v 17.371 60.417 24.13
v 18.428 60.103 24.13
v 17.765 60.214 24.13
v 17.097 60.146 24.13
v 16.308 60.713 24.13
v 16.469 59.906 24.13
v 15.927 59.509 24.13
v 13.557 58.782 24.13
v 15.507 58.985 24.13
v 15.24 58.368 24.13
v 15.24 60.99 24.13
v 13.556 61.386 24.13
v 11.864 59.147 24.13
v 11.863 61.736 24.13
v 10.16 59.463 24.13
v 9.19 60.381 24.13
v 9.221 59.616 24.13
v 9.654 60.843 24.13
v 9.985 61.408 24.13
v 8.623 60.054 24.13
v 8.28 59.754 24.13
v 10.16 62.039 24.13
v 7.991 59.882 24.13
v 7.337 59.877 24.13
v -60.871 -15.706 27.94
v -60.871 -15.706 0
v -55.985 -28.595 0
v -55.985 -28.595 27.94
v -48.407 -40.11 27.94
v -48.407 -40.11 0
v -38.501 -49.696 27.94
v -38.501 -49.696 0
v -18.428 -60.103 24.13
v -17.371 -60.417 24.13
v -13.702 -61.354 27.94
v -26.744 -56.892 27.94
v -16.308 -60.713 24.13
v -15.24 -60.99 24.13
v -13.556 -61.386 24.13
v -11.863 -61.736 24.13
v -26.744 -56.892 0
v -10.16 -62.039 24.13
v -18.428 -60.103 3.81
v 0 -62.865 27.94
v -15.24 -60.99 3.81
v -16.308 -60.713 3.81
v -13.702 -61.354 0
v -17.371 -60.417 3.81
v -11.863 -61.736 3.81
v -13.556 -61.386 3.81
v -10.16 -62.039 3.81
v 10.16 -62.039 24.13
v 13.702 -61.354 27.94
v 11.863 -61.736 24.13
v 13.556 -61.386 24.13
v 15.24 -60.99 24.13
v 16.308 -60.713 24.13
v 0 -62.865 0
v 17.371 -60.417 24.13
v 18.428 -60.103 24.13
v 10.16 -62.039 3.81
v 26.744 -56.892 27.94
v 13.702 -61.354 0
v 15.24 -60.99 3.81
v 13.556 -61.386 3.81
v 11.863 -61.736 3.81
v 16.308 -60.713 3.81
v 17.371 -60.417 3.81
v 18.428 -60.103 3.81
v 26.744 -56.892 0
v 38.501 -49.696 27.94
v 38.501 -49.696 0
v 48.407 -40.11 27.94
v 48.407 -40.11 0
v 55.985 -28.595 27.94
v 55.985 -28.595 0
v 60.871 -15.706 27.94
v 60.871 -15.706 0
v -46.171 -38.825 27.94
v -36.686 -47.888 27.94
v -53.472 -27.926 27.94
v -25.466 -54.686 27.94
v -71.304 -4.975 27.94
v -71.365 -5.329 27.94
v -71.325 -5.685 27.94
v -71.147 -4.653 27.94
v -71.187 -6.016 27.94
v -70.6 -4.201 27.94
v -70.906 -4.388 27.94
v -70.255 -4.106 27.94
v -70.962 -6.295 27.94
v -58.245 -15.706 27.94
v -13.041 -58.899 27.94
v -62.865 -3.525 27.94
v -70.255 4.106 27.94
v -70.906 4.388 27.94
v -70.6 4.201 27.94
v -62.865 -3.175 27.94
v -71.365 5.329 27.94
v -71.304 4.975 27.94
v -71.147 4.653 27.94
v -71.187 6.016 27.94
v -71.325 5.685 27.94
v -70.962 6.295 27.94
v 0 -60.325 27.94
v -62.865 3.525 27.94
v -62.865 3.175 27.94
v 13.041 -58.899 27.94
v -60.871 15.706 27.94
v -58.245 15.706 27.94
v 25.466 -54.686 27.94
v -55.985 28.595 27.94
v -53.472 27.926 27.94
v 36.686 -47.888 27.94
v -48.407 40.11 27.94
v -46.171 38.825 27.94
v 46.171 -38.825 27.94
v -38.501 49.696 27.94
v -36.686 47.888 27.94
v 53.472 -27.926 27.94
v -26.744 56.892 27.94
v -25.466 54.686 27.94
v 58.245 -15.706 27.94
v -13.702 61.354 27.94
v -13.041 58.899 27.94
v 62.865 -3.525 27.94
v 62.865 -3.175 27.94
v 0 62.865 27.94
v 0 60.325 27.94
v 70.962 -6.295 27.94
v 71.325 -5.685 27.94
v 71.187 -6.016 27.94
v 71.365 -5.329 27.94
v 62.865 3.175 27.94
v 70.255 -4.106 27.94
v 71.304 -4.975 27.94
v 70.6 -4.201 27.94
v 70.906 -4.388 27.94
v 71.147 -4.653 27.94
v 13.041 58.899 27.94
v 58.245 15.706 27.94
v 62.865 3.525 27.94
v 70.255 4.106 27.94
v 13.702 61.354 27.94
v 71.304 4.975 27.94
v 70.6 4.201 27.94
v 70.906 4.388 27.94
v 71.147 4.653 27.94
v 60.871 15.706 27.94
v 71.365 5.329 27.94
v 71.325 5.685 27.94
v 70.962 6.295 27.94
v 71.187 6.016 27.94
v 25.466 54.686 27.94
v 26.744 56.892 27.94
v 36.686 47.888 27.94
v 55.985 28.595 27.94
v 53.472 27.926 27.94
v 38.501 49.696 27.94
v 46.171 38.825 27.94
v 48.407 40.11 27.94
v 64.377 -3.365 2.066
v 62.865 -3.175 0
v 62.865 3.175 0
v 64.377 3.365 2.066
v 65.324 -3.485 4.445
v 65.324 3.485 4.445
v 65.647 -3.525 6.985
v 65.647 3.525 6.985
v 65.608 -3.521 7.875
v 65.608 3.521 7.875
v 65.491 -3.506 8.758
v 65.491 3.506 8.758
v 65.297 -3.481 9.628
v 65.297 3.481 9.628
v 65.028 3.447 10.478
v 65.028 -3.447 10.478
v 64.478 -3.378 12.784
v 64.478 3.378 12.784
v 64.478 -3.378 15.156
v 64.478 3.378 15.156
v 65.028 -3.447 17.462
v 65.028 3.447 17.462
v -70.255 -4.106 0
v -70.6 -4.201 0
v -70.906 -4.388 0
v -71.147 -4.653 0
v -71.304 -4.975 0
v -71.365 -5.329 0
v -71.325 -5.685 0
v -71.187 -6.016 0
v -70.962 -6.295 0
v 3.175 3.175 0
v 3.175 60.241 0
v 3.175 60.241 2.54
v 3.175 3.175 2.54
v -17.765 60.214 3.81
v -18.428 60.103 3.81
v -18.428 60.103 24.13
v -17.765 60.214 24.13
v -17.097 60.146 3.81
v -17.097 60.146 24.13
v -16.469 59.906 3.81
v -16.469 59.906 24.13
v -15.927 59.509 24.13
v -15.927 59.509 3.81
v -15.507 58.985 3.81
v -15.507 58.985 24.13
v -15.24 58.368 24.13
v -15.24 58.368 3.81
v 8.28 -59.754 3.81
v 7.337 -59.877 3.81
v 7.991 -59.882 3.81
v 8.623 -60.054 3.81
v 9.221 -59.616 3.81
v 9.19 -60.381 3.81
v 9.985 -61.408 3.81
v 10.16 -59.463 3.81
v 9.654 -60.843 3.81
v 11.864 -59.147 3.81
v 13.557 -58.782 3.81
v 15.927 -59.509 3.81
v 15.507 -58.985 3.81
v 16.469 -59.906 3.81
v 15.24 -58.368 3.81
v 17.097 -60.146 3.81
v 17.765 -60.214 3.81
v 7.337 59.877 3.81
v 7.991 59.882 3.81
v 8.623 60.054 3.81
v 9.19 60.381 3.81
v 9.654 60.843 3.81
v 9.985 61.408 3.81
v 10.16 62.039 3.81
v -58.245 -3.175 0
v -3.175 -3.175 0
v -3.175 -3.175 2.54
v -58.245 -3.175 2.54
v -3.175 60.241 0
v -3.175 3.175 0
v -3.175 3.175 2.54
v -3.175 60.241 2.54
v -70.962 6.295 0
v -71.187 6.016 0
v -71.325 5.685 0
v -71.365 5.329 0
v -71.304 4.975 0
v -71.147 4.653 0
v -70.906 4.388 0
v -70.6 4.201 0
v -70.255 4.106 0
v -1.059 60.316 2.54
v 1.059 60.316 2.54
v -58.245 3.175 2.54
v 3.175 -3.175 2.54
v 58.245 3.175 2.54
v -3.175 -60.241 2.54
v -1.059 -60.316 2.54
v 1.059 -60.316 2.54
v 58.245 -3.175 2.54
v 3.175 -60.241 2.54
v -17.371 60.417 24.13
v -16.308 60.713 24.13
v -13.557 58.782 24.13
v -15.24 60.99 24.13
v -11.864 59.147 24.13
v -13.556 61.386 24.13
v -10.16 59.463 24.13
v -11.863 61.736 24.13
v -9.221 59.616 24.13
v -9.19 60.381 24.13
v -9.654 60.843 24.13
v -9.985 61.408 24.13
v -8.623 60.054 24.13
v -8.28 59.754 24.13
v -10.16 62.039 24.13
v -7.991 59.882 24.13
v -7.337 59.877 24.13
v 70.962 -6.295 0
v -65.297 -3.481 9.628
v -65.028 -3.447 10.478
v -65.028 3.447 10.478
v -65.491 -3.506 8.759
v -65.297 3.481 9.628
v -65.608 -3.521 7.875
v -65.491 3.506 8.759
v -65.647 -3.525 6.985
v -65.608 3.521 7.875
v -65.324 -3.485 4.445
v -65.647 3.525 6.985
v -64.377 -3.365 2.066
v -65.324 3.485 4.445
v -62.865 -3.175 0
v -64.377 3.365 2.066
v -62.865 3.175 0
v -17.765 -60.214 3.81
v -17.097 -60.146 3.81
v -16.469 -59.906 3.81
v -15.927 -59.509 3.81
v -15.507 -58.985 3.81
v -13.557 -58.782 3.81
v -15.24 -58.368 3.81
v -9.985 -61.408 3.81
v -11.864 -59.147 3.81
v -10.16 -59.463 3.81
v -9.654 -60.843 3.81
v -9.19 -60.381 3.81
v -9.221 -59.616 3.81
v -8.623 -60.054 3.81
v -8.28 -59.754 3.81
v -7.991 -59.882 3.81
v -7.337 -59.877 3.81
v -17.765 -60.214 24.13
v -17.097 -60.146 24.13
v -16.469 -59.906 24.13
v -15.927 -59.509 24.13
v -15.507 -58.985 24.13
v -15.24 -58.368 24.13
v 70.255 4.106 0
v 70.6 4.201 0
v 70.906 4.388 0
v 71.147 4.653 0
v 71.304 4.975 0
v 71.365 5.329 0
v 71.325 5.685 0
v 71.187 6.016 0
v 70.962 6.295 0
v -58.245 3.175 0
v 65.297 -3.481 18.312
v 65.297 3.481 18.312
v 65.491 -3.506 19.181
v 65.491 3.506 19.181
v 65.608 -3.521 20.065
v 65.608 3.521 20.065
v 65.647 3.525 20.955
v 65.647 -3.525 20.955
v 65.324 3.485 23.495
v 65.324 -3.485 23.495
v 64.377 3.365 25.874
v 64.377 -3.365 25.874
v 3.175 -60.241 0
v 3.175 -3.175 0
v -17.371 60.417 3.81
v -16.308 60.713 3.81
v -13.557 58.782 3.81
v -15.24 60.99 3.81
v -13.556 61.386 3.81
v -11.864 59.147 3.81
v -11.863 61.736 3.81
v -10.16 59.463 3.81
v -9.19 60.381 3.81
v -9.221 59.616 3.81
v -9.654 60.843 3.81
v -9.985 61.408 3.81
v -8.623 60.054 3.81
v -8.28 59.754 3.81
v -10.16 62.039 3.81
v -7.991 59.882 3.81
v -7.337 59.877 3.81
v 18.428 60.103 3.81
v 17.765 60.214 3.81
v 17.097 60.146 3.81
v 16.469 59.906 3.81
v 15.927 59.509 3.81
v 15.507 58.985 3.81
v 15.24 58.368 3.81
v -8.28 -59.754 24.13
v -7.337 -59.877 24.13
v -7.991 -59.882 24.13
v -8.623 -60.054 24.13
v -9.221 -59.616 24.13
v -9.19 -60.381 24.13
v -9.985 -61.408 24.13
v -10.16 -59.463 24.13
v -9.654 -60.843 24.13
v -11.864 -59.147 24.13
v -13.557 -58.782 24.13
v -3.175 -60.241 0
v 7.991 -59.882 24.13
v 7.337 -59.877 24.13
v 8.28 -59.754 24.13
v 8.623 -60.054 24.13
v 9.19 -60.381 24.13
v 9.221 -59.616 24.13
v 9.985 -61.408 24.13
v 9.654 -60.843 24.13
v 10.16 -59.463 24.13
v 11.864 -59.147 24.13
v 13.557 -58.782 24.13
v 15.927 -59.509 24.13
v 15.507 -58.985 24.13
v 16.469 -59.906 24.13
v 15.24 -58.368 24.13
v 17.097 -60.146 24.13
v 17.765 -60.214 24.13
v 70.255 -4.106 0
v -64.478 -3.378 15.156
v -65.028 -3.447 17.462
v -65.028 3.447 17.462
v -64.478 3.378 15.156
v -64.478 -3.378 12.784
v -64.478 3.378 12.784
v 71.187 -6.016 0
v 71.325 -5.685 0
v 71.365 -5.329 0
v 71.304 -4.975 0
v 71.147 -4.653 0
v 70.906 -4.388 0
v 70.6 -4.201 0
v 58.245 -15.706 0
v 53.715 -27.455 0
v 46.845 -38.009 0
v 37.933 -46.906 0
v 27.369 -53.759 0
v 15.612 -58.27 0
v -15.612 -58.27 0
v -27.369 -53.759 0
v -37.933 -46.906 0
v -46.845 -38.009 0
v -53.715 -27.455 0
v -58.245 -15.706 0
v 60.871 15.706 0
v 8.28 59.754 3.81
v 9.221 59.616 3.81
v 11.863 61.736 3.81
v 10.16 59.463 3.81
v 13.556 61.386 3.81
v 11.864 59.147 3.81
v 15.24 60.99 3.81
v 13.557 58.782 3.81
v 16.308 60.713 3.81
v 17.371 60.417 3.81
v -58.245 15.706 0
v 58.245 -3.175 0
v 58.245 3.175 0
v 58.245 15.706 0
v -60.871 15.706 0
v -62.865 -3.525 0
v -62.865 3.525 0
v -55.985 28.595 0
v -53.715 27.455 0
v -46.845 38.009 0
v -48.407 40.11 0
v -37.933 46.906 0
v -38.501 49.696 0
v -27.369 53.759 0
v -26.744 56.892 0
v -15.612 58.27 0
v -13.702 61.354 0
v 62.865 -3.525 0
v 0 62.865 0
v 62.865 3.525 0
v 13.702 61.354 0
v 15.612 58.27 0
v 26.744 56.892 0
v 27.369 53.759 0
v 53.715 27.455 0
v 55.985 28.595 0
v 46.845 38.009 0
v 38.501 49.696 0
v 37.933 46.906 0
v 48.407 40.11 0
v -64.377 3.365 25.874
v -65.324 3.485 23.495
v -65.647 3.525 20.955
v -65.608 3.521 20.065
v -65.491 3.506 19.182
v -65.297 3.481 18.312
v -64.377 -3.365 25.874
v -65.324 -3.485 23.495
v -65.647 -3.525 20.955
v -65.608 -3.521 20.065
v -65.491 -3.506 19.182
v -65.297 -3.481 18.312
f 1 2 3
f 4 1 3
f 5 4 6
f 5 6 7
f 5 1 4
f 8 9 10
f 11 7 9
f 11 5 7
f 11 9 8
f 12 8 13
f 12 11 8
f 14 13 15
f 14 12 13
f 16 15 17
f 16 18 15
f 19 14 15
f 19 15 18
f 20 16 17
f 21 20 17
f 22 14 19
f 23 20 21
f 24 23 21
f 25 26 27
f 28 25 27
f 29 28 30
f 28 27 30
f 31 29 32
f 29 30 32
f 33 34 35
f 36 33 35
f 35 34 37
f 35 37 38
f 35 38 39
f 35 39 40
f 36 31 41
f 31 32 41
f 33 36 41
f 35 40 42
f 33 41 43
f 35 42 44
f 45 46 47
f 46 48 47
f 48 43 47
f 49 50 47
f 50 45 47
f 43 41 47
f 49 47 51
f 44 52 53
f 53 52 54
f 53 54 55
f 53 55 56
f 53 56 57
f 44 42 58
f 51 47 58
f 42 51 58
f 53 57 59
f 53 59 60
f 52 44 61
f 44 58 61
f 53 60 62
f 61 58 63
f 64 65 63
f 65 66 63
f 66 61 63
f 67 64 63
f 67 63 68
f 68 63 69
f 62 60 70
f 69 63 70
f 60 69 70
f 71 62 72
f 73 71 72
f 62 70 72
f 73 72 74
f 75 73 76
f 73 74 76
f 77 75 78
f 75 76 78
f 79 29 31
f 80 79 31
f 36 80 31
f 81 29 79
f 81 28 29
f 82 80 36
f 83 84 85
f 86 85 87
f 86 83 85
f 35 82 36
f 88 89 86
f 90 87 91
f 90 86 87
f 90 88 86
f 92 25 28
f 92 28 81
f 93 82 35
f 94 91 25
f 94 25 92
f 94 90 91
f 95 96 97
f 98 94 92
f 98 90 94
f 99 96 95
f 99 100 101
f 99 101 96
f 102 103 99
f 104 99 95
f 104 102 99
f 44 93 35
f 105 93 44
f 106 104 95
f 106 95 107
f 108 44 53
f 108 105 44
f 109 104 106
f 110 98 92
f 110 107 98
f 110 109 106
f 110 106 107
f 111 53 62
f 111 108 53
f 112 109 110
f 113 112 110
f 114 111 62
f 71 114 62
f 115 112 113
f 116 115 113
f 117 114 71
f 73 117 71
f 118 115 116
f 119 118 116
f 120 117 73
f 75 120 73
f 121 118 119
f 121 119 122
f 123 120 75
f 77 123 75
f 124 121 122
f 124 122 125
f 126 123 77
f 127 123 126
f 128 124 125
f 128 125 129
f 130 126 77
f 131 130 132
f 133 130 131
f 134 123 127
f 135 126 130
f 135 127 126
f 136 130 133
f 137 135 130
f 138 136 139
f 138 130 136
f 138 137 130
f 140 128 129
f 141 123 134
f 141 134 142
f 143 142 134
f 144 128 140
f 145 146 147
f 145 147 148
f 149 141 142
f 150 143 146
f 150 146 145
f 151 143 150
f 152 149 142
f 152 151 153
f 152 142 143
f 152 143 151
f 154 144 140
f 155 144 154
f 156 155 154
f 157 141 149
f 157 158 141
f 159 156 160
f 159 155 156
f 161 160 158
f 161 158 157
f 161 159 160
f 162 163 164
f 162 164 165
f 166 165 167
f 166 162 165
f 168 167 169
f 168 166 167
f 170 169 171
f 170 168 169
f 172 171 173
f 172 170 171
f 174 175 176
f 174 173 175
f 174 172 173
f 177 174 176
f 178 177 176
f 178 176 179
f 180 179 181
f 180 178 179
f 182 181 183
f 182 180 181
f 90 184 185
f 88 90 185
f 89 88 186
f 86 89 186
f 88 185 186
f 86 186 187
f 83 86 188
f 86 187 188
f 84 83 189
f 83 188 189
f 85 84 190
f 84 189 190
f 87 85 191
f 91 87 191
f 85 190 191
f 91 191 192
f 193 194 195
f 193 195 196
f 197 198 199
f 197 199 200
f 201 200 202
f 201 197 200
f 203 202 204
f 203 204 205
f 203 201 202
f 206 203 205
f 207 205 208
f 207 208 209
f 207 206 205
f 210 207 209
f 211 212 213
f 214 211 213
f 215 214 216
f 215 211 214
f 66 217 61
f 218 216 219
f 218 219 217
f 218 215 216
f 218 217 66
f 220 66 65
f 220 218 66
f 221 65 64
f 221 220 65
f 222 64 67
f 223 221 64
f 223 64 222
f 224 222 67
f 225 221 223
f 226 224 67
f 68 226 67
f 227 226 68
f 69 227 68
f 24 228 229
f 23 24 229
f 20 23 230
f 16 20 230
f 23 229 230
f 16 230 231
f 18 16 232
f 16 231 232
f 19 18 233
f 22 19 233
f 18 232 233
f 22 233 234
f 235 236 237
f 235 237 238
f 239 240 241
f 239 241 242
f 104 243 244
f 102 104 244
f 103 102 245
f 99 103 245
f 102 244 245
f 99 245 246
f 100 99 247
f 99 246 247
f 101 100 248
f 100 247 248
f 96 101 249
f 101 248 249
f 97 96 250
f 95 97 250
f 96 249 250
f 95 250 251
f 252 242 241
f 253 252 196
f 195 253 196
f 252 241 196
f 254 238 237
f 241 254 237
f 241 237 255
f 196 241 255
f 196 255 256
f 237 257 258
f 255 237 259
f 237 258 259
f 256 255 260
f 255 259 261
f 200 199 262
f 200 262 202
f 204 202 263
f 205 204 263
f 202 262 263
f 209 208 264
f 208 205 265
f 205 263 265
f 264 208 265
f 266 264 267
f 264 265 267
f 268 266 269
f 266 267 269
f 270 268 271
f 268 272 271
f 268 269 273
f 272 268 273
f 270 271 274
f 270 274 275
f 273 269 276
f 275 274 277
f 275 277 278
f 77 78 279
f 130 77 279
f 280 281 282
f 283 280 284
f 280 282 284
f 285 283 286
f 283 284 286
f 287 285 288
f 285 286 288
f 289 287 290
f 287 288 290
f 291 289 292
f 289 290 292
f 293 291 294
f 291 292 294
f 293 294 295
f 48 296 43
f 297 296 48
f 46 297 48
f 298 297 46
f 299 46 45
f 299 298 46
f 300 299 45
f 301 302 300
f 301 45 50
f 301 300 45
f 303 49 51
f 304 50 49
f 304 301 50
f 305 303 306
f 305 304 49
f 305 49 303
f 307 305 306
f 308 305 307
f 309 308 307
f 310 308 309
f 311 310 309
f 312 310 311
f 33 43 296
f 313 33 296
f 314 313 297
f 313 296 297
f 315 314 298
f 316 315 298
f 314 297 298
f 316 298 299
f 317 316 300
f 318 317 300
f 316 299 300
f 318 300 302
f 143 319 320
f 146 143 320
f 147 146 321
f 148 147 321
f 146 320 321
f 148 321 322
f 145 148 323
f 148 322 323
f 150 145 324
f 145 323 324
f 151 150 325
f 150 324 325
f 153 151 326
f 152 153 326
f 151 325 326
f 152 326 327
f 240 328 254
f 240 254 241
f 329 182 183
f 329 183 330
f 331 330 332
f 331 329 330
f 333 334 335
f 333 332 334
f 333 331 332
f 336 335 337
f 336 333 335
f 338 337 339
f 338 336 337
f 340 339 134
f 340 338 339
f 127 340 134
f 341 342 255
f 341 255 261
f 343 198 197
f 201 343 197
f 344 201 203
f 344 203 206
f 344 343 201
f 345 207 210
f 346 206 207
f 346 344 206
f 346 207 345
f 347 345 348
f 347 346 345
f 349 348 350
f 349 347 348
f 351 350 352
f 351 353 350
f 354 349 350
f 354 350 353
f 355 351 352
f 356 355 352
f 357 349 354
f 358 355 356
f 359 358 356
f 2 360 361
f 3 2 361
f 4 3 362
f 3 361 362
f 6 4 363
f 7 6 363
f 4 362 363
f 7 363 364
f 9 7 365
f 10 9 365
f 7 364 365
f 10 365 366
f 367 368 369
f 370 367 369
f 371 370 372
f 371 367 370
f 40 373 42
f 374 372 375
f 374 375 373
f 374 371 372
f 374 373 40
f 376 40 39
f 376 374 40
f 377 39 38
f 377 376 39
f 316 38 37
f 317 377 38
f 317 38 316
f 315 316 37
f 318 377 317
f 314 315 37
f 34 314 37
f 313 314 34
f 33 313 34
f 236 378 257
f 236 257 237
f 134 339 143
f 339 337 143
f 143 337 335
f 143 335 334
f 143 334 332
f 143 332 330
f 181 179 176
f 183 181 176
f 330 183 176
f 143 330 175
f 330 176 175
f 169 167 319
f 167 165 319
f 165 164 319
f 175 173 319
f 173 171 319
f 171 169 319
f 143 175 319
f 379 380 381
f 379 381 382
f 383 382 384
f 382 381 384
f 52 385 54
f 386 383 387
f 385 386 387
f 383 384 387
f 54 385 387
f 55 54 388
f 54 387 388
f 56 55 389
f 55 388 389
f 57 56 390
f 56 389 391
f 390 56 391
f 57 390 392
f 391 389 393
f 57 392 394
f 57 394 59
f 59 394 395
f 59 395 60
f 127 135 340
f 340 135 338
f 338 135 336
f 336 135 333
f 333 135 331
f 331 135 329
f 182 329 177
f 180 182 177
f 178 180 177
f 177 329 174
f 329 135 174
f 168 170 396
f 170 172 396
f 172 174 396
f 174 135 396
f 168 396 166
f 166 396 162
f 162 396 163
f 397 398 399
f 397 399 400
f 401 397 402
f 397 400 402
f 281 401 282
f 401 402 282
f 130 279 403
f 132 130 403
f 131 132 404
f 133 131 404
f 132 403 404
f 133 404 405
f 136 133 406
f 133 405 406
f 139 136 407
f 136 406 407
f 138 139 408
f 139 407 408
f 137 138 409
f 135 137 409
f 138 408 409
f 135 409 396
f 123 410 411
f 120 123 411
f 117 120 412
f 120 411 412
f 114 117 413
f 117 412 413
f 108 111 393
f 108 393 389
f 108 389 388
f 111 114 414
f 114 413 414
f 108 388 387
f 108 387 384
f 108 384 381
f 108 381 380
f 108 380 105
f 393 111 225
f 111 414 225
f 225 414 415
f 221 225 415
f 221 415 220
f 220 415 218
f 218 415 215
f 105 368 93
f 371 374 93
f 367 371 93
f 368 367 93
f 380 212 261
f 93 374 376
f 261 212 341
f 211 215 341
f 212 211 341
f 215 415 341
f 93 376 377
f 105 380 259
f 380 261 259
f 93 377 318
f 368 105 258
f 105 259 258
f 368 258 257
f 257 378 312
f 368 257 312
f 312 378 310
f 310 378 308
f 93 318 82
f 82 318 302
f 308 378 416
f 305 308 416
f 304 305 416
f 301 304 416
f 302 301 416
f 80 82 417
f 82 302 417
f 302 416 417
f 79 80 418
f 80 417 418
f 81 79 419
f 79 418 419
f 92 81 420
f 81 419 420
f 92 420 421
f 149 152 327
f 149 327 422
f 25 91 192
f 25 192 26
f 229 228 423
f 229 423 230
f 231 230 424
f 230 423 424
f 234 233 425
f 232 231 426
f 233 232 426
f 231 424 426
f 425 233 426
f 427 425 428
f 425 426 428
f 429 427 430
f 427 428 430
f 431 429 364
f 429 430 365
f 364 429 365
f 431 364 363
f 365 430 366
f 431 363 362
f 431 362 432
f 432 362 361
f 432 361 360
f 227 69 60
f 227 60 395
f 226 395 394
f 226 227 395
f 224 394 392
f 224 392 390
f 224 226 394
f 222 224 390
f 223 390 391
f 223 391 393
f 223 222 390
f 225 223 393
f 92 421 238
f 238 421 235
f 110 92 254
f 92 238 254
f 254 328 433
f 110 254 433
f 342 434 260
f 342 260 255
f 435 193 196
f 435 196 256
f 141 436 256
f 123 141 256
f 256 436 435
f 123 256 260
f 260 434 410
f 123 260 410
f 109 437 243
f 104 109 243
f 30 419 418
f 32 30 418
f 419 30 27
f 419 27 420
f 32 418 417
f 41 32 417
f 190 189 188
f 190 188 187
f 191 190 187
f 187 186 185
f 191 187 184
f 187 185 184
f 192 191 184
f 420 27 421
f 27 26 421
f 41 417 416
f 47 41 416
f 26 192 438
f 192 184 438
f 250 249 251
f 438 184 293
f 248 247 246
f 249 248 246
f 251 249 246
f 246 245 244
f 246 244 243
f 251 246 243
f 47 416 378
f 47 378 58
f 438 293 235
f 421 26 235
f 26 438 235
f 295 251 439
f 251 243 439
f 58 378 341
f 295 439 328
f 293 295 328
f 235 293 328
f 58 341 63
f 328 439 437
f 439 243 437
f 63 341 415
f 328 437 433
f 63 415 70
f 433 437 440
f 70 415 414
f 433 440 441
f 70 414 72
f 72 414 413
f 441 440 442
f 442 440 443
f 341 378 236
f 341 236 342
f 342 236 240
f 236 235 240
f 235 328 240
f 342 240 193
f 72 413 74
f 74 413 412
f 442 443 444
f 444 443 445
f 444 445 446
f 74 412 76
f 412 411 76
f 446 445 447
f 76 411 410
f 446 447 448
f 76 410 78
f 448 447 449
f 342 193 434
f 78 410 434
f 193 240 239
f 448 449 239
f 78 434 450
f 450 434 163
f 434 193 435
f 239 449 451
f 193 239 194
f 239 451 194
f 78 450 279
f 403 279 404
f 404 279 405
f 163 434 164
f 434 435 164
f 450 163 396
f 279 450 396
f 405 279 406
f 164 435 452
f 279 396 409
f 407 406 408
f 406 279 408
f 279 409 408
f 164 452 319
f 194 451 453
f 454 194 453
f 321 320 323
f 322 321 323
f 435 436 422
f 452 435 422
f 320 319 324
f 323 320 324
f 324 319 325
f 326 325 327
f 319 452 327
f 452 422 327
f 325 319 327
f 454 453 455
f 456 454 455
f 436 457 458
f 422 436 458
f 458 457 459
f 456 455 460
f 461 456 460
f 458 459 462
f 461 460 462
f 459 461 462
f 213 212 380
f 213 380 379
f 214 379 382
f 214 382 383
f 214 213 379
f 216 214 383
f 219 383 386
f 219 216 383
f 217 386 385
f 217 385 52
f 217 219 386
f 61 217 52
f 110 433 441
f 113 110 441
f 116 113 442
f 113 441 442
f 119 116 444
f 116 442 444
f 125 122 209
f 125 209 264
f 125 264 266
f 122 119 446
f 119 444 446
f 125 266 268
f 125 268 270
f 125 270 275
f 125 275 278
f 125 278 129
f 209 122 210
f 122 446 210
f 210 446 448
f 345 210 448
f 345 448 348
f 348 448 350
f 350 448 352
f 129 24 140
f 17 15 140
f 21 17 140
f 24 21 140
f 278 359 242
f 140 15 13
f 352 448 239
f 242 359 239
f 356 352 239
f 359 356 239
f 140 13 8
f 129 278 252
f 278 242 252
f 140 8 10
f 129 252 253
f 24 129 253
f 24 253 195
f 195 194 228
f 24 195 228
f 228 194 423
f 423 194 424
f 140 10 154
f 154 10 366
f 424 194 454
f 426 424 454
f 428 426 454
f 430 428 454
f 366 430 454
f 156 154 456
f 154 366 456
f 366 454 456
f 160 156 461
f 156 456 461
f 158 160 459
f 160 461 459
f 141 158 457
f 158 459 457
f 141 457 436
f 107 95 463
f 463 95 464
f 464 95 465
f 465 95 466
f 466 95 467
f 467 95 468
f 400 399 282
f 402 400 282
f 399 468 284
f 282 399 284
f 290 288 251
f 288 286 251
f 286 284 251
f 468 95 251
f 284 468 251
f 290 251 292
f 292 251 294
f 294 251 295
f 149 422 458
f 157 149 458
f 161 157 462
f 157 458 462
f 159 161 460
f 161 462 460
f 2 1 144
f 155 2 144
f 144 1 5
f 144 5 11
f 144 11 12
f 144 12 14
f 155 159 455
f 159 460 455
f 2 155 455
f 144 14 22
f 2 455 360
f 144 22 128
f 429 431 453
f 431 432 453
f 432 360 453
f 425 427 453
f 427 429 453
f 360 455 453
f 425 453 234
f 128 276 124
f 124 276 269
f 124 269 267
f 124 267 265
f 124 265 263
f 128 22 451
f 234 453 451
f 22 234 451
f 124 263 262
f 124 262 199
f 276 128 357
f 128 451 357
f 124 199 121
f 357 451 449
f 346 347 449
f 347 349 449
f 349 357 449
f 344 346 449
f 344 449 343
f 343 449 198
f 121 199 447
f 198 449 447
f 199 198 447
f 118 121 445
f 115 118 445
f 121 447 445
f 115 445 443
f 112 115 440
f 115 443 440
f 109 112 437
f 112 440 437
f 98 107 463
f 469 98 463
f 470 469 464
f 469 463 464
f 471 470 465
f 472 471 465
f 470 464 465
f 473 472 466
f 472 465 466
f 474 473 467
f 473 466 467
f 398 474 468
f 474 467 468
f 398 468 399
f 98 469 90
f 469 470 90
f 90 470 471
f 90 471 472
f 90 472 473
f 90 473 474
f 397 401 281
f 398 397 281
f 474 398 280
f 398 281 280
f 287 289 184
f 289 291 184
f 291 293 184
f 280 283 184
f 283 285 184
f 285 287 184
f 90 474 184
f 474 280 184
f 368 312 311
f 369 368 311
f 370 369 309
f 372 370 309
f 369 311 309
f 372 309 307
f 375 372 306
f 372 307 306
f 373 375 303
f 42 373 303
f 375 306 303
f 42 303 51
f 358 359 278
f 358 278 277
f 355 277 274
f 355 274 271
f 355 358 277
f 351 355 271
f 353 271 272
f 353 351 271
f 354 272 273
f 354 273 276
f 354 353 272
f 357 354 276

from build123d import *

# Parameters (mm, degrees)
F1_DEPTH      = 27.94
F2_W          = 59.69
F2_H          = 6.35
F2_W_2        = 6.35
F3_DEPTH      = 2.54
F4_W          = 5.08
F4_H          = 20.32
F5_DEPTH      = 62.866
F5_DEPTH_BACK = 62.866
F6_T1_DEPTH   = 20.32
F8_DEPTH      = 3.5254948624
F8_DEPTH_BACK = 3.5254948624


# Not quite as in the source:
# - a fillet or chamfer that OpenCascade refuses, or shapes differently, is made with other operations: its cross-section is extruded or revolved along the edge and cut away or added


with BuildPart() as f1:
    # F0 (on Top) → F1 (new body)
    with BuildSketch(Plane.XY):
        with BuildLine():
            Line((-70.9619581652, -6.2947835132), (-60.8714999798, -15.7056905359))
            ThreePointArc((-60.8714999798, -15.7056905359), (-62.3646336926, -7.9158505156), (-62.865, 0))
            Line((-62.865, 0), (-62.865, -3.175))
            Line((-62.865, -3.175), (-70.254501201, -4.1059896424))
            ThreePointArc((-70.254501201, -4.1059896424), (-71.304196006, -4.9754379298), (-70.9619581652, -6.2947835132))
        make_face()
        with BuildLine():
            ThreePointArc((-58.2446298794, 15.7056905359), (0, 60.325), (58.2446298794, 15.7056905359))
            Line((58.2446298794, 15.7056905359), (60.8714999798, 15.7056905359))
            ThreePointArc((60.8714999798, 15.7056905359), (0, 62.865), (-60.8714999798, 15.7056905359))
            Line((-60.8714999798, 15.7056905359), (-58.2446298794, 15.7056905359))
        make_face()
        with BuildLine():
            ThreePointArc((-58.2446298794, -15.7056905359), (-60.325, 0), (-58.2446298794, 15.7056905359))
            Line((-58.2446298794, 15.7056905359), (-60.8714999798, 15.7056905359))
            ThreePointArc((-60.8714999798, 15.7056905359), (-62.3646336926, 7.9158505156), (-62.865, 0))
            ThreePointArc((-62.865, 0), (-62.3646336926, -7.9158505156), (-60.8714999798, -15.7056905359))
            Line((-60.8714999798, -15.7056905359), (-58.2446298794, -15.7056905359))
        make_face()
        with BuildLine():
            Line((60.8714999798, -15.7056905359), (58.2446298794, -15.7056905359))
            ThreePointArc((58.2446298794, -15.7056905359), (0, -60.325), (-58.2446298794, -15.7056905359))
            Line((-58.2446298794, -15.7056905359), (-60.8714999798, -15.7056905359))
            ThreePointArc((-60.8714999798, -15.7056905359), (0, -62.865), (60.8714999798, -15.7056905359))
        make_face()
        with BuildLine():
            ThreePointArc((58.2446298794, 15.7056905359), (59.8026459384, 7.9214369758), (60.325, 0))
            ThreePointArc((60.325, 0), (59.8026459384, -7.9214369758), (58.2446298794, -15.7056905359))
            Line((58.2446298794, -15.7056905359), (60.8714999798, -15.7056905359))
            ThreePointArc((60.8714999798, -15.7056905359), (62.3646336926, -7.9158505156), (62.865, 0))
            ThreePointArc((62.865, 0), (62.3646336926, 7.9158505156), (60.8714999798, 15.7056905359))
            Line((60.8714999798, 15.7056905359), (58.2446298794, 15.7056905359))
        make_face()
        with BuildLine():
            Line((70.9619581652, 6.2947835132), (60.8714999798, 15.7056905359))
            ThreePointArc((60.8714999798, 15.7056905359), (62.3646336926, 7.9158505156), (62.865, 0))
            Line((62.865, 0), (62.865, 3.175))
            Line((62.865, 3.175), (70.254501201, 4.1059896424))
            ThreePointArc((70.254501201, 4.1059896424), (71.304196006, 4.9754379298), (70.9619581652, 6.2947835132))
        make_face()
        with BuildLine():
            ThreePointArc((62.865, 0), (62.3646336926, -7.9158505156), (60.8714999798, -15.7056905359))
            Line((60.8714999798, -15.7056905359), (70.9619581652, -6.2947835132))
            ThreePointArc((70.9619581652, -6.2947835132), (71.304196006, -4.9754379298), (70.254501201, -4.1059896424))
            Line((70.254501201, -4.1059896424), (62.865, -3.175))
            Line((62.865, -3.175), (62.865, 0))
        make_face()
        with BuildLine():
            ThreePointArc((-62.865, 0), (-62.3646336926, 7.9158505156), (-60.8714999798, 15.7056905359))
            Line((-60.8714999798, 15.7056905359), (-70.9619581652, 6.2947835132))
            ThreePointArc((-70.9619581652, 6.2947835132), (-71.304196006, 4.9754379298), (-70.254501201, 4.1059896424))
            Line((-70.254501201, 4.1059896424), (-62.865, 3.175))
            Line((-62.865, 3.175), (-62.865, 0))
        make_face()
        with BuildLine():
            ThreePointArc((58.2446298794, -15.7056905359), (59.8026459384, -7.9214369758), (60.325, 0))
            ThreePointArc((60.325, 0), (59.8026459384, 7.9214369758), (58.2446298794, 15.7056905359))
            Line((58.2446298794, 15.7056905359), (58.2446298794, -15.7056905359))
        make_face()
        with BuildLine():
            Line((-58.2446298794, -15.7056905359), (-58.2446298794, 15.7056905359))
            ThreePointArc((-58.2446298794, 15.7056905359), (-60.325, 0), (-58.2446298794, -15.7056905359))
        make_face()
    extrude(amount=F1_DEPTH)

    # F2 (on face) → F3 (join)
    with BuildSketch(Plane(origin=(0, 0, 0), x_dir=(1, 0, 0), z_dir=(0, 0, -1))):
        with Locations((33.02, 0)):
            Rectangle(F2_W, F2_H)
        Rectangle(F2_W_2, F2_H)
        with Locations((-33.02, 0)):
            Rectangle(F2_W, F2_H)
        with BuildLine():
            Line((-3.175, 3.175), (3.175, 3.175))
            Line((3.175, 3.175), (3.175, 60.2413894262))
            ThreePointArc((3.175, 60.2413894262), (0, 60.325), (-3.175, 60.2413894262))
            Line((-3.175, 60.2413894262), (-3.175, 3.175))
        make_face()
        with BuildLine():
            Line((3.175, -60.2413894262), (3.175, -3.175))
            Line((3.175, -3.175), (-3.175, -3.175))
            Line((-3.175, -3.175), (-3.175, -60.2413894262))
            ThreePointArc((-3.175, -60.2413894262), (0, -60.325), (3.175, -60.2413894262))
        make_face()
    extrude(amount=-F3_DEPTH)

    # F4 (on Front) → F5 (cut, two sides)
    with BuildSketch(Plane.XZ) as f5_sk:
        with Locations((-12.7, 13.97)):
            Rectangle(F4_W, F4_H)
        with Locations((12.7, 13.97)):
            Rectangle(F4_W, F4_H)
    extrude(amount=-F5_DEPTH, mode=Mode.SUBTRACT)
    extrude(f5_sk.sketch, amount=F5_DEPTH_BACK, mode=Mode.SUBTRACT)

    # F6: fillet of radius 2.54 on 8 edges, made by hand

    # F6_s2 → F6_t1 (cut)
    with BuildSketch(Plane.XY.offset(3.81)):
        with BuildLine():
            ThreePointArc((18.4281257881, 60.1033477016), (16.4693425511, 59.9059132544), (15.24, 58.3682107401))
            Line((15.24, 58.3682107401), (15.24, 60.9897583615))
            ThreePointArc((15.24, 60.9897583615), (16.8398962136, 60.5675335515), (18.4281257881, 60.1033477016))
        make_face()
        with BuildLine():
            ThreePointArc((-18.4281257881, 60.1033477016), (-16.4693425511, 59.9059132544), (-15.24, 58.3682107401))
            Line((-15.24, 58.3682107401), (-15.24, 60.9897583615))
            ThreePointArc((-15.24, 60.9897583615), (-16.8398962136, 60.5675335515), (-18.4281257881, 60.1033477016))
        make_face()
        with BuildLine():
            ThreePointArc((7.3366965941, 59.8771952256), (9.1895995283, 60.3814871069), (10.16, 62.038557567))
            Line((10.16, 62.038557567), (10.16, 59.4632661817))
            ThreePointArc((10.16, 59.4632661817), (8.7507960918, 59.6869264811), (7.3366965941, 59.8771952256))
        make_face()
        with BuildLine():
            ThreePointArc((-7.3366965941, 59.8771952256), (-9.1895995283, 60.3814871069), (-10.16, 62.038557567))
            Line((-10.16, 62.038557567), (-10.16, 59.4632661817))
            ThreePointArc((-10.16, 59.4632661817), (-8.7507960918, 59.6869264811), (-7.3366965941, 59.8771952256))
        make_face()
        with BuildLine():
            ThreePointArc((-18.4281257881, -60.1033477016), (-16.4693425511, -59.9059132544), (-15.24, -58.3682107401))
            Line((-15.24, -58.3682107401), (-15.24, -60.9897583615))
            ThreePointArc((-15.24, -60.9897583615), (-16.8398962136, -60.5675335515), (-18.4281257881, -60.1033477016))
        make_face()
        with BuildLine():
            ThreePointArc((18.4281257881, -60.1033477016), (16.4693425511, -59.9059132544), (15.24, -58.3682107401))
            Line((15.24, -58.3682107401), (15.24, -60.9897583615))
            ThreePointArc((15.24, -60.9897583615), (16.8398962136, -60.5675335515), (18.4281257881, -60.1033477016))
        make_face()
        with BuildLine():
            ThreePointArc((7.3366965941, -59.8771952256), (9.1895995283, -60.3814871069), (10.16, -62.038557567))
            Line((10.16, -62.038557567), (10.16, -59.4632661817))
            ThreePointArc((10.16, -59.4632661817), (8.7507960918, -59.6869264811), (7.3366965941, -59.8771952256))
        make_face()
        with BuildLine():
            ThreePointArc((-7.3366965941, -59.8771952256), (-9.1895995283, -60.3814871069), (-10.16, -62.038557567))
            Line((-10.16, -62.038557567), (-10.16, -59.4632661817))
            ThreePointArc((-10.16, -59.4632661817), (-8.7507960918, -59.6869264811), (-7.3366965941, -59.8771952256))
        make_face()
    extrude(amount=F6_T1_DEPTH, mode=Mode.SUBTRACT)

    # F7 (on Front) → F8 (join, two sides)
    with BuildSketch(Plane.XZ) as f8_sk:
        with BuildLine():
            ThreePointArc((65.0278285183, 17.4625), (65.4371804989, 23.0089829265), (62.865, 27.94))
            Line((62.865, 27.94), (62.865, 0))
            ThreePointArc((62.865, 0), (65.4371804989, 4.9310170735), (65.0278285183, 10.4775))
            ThreePointArc((65.0278285183, 10.4775), (64.4086903111, 13.97), (65.0278285183, 17.4625))
        make_face()
        with BuildLine():
            ThreePointArc((-65.0278285183, 10.4775), (-65.4371804989, 4.9310170735), (-62.865, 0))
            Line((-62.865, 0), (-62.865, 27.94))
            ThreePointArc((-62.865, 27.94), (-65.4371804989, 23.0089829265), (-65.0278285183, 17.4625))
            ThreePointArc((-65.0278285183, 17.4625), (-64.4086903111, 13.97), (-65.0278285183, 10.4775))
        make_face()
    extrude(amount=F8_DEPTH)
    extrude(f8_sk.sketch, amount=-F8_DEPTH_BACK)


solid = f1.part
